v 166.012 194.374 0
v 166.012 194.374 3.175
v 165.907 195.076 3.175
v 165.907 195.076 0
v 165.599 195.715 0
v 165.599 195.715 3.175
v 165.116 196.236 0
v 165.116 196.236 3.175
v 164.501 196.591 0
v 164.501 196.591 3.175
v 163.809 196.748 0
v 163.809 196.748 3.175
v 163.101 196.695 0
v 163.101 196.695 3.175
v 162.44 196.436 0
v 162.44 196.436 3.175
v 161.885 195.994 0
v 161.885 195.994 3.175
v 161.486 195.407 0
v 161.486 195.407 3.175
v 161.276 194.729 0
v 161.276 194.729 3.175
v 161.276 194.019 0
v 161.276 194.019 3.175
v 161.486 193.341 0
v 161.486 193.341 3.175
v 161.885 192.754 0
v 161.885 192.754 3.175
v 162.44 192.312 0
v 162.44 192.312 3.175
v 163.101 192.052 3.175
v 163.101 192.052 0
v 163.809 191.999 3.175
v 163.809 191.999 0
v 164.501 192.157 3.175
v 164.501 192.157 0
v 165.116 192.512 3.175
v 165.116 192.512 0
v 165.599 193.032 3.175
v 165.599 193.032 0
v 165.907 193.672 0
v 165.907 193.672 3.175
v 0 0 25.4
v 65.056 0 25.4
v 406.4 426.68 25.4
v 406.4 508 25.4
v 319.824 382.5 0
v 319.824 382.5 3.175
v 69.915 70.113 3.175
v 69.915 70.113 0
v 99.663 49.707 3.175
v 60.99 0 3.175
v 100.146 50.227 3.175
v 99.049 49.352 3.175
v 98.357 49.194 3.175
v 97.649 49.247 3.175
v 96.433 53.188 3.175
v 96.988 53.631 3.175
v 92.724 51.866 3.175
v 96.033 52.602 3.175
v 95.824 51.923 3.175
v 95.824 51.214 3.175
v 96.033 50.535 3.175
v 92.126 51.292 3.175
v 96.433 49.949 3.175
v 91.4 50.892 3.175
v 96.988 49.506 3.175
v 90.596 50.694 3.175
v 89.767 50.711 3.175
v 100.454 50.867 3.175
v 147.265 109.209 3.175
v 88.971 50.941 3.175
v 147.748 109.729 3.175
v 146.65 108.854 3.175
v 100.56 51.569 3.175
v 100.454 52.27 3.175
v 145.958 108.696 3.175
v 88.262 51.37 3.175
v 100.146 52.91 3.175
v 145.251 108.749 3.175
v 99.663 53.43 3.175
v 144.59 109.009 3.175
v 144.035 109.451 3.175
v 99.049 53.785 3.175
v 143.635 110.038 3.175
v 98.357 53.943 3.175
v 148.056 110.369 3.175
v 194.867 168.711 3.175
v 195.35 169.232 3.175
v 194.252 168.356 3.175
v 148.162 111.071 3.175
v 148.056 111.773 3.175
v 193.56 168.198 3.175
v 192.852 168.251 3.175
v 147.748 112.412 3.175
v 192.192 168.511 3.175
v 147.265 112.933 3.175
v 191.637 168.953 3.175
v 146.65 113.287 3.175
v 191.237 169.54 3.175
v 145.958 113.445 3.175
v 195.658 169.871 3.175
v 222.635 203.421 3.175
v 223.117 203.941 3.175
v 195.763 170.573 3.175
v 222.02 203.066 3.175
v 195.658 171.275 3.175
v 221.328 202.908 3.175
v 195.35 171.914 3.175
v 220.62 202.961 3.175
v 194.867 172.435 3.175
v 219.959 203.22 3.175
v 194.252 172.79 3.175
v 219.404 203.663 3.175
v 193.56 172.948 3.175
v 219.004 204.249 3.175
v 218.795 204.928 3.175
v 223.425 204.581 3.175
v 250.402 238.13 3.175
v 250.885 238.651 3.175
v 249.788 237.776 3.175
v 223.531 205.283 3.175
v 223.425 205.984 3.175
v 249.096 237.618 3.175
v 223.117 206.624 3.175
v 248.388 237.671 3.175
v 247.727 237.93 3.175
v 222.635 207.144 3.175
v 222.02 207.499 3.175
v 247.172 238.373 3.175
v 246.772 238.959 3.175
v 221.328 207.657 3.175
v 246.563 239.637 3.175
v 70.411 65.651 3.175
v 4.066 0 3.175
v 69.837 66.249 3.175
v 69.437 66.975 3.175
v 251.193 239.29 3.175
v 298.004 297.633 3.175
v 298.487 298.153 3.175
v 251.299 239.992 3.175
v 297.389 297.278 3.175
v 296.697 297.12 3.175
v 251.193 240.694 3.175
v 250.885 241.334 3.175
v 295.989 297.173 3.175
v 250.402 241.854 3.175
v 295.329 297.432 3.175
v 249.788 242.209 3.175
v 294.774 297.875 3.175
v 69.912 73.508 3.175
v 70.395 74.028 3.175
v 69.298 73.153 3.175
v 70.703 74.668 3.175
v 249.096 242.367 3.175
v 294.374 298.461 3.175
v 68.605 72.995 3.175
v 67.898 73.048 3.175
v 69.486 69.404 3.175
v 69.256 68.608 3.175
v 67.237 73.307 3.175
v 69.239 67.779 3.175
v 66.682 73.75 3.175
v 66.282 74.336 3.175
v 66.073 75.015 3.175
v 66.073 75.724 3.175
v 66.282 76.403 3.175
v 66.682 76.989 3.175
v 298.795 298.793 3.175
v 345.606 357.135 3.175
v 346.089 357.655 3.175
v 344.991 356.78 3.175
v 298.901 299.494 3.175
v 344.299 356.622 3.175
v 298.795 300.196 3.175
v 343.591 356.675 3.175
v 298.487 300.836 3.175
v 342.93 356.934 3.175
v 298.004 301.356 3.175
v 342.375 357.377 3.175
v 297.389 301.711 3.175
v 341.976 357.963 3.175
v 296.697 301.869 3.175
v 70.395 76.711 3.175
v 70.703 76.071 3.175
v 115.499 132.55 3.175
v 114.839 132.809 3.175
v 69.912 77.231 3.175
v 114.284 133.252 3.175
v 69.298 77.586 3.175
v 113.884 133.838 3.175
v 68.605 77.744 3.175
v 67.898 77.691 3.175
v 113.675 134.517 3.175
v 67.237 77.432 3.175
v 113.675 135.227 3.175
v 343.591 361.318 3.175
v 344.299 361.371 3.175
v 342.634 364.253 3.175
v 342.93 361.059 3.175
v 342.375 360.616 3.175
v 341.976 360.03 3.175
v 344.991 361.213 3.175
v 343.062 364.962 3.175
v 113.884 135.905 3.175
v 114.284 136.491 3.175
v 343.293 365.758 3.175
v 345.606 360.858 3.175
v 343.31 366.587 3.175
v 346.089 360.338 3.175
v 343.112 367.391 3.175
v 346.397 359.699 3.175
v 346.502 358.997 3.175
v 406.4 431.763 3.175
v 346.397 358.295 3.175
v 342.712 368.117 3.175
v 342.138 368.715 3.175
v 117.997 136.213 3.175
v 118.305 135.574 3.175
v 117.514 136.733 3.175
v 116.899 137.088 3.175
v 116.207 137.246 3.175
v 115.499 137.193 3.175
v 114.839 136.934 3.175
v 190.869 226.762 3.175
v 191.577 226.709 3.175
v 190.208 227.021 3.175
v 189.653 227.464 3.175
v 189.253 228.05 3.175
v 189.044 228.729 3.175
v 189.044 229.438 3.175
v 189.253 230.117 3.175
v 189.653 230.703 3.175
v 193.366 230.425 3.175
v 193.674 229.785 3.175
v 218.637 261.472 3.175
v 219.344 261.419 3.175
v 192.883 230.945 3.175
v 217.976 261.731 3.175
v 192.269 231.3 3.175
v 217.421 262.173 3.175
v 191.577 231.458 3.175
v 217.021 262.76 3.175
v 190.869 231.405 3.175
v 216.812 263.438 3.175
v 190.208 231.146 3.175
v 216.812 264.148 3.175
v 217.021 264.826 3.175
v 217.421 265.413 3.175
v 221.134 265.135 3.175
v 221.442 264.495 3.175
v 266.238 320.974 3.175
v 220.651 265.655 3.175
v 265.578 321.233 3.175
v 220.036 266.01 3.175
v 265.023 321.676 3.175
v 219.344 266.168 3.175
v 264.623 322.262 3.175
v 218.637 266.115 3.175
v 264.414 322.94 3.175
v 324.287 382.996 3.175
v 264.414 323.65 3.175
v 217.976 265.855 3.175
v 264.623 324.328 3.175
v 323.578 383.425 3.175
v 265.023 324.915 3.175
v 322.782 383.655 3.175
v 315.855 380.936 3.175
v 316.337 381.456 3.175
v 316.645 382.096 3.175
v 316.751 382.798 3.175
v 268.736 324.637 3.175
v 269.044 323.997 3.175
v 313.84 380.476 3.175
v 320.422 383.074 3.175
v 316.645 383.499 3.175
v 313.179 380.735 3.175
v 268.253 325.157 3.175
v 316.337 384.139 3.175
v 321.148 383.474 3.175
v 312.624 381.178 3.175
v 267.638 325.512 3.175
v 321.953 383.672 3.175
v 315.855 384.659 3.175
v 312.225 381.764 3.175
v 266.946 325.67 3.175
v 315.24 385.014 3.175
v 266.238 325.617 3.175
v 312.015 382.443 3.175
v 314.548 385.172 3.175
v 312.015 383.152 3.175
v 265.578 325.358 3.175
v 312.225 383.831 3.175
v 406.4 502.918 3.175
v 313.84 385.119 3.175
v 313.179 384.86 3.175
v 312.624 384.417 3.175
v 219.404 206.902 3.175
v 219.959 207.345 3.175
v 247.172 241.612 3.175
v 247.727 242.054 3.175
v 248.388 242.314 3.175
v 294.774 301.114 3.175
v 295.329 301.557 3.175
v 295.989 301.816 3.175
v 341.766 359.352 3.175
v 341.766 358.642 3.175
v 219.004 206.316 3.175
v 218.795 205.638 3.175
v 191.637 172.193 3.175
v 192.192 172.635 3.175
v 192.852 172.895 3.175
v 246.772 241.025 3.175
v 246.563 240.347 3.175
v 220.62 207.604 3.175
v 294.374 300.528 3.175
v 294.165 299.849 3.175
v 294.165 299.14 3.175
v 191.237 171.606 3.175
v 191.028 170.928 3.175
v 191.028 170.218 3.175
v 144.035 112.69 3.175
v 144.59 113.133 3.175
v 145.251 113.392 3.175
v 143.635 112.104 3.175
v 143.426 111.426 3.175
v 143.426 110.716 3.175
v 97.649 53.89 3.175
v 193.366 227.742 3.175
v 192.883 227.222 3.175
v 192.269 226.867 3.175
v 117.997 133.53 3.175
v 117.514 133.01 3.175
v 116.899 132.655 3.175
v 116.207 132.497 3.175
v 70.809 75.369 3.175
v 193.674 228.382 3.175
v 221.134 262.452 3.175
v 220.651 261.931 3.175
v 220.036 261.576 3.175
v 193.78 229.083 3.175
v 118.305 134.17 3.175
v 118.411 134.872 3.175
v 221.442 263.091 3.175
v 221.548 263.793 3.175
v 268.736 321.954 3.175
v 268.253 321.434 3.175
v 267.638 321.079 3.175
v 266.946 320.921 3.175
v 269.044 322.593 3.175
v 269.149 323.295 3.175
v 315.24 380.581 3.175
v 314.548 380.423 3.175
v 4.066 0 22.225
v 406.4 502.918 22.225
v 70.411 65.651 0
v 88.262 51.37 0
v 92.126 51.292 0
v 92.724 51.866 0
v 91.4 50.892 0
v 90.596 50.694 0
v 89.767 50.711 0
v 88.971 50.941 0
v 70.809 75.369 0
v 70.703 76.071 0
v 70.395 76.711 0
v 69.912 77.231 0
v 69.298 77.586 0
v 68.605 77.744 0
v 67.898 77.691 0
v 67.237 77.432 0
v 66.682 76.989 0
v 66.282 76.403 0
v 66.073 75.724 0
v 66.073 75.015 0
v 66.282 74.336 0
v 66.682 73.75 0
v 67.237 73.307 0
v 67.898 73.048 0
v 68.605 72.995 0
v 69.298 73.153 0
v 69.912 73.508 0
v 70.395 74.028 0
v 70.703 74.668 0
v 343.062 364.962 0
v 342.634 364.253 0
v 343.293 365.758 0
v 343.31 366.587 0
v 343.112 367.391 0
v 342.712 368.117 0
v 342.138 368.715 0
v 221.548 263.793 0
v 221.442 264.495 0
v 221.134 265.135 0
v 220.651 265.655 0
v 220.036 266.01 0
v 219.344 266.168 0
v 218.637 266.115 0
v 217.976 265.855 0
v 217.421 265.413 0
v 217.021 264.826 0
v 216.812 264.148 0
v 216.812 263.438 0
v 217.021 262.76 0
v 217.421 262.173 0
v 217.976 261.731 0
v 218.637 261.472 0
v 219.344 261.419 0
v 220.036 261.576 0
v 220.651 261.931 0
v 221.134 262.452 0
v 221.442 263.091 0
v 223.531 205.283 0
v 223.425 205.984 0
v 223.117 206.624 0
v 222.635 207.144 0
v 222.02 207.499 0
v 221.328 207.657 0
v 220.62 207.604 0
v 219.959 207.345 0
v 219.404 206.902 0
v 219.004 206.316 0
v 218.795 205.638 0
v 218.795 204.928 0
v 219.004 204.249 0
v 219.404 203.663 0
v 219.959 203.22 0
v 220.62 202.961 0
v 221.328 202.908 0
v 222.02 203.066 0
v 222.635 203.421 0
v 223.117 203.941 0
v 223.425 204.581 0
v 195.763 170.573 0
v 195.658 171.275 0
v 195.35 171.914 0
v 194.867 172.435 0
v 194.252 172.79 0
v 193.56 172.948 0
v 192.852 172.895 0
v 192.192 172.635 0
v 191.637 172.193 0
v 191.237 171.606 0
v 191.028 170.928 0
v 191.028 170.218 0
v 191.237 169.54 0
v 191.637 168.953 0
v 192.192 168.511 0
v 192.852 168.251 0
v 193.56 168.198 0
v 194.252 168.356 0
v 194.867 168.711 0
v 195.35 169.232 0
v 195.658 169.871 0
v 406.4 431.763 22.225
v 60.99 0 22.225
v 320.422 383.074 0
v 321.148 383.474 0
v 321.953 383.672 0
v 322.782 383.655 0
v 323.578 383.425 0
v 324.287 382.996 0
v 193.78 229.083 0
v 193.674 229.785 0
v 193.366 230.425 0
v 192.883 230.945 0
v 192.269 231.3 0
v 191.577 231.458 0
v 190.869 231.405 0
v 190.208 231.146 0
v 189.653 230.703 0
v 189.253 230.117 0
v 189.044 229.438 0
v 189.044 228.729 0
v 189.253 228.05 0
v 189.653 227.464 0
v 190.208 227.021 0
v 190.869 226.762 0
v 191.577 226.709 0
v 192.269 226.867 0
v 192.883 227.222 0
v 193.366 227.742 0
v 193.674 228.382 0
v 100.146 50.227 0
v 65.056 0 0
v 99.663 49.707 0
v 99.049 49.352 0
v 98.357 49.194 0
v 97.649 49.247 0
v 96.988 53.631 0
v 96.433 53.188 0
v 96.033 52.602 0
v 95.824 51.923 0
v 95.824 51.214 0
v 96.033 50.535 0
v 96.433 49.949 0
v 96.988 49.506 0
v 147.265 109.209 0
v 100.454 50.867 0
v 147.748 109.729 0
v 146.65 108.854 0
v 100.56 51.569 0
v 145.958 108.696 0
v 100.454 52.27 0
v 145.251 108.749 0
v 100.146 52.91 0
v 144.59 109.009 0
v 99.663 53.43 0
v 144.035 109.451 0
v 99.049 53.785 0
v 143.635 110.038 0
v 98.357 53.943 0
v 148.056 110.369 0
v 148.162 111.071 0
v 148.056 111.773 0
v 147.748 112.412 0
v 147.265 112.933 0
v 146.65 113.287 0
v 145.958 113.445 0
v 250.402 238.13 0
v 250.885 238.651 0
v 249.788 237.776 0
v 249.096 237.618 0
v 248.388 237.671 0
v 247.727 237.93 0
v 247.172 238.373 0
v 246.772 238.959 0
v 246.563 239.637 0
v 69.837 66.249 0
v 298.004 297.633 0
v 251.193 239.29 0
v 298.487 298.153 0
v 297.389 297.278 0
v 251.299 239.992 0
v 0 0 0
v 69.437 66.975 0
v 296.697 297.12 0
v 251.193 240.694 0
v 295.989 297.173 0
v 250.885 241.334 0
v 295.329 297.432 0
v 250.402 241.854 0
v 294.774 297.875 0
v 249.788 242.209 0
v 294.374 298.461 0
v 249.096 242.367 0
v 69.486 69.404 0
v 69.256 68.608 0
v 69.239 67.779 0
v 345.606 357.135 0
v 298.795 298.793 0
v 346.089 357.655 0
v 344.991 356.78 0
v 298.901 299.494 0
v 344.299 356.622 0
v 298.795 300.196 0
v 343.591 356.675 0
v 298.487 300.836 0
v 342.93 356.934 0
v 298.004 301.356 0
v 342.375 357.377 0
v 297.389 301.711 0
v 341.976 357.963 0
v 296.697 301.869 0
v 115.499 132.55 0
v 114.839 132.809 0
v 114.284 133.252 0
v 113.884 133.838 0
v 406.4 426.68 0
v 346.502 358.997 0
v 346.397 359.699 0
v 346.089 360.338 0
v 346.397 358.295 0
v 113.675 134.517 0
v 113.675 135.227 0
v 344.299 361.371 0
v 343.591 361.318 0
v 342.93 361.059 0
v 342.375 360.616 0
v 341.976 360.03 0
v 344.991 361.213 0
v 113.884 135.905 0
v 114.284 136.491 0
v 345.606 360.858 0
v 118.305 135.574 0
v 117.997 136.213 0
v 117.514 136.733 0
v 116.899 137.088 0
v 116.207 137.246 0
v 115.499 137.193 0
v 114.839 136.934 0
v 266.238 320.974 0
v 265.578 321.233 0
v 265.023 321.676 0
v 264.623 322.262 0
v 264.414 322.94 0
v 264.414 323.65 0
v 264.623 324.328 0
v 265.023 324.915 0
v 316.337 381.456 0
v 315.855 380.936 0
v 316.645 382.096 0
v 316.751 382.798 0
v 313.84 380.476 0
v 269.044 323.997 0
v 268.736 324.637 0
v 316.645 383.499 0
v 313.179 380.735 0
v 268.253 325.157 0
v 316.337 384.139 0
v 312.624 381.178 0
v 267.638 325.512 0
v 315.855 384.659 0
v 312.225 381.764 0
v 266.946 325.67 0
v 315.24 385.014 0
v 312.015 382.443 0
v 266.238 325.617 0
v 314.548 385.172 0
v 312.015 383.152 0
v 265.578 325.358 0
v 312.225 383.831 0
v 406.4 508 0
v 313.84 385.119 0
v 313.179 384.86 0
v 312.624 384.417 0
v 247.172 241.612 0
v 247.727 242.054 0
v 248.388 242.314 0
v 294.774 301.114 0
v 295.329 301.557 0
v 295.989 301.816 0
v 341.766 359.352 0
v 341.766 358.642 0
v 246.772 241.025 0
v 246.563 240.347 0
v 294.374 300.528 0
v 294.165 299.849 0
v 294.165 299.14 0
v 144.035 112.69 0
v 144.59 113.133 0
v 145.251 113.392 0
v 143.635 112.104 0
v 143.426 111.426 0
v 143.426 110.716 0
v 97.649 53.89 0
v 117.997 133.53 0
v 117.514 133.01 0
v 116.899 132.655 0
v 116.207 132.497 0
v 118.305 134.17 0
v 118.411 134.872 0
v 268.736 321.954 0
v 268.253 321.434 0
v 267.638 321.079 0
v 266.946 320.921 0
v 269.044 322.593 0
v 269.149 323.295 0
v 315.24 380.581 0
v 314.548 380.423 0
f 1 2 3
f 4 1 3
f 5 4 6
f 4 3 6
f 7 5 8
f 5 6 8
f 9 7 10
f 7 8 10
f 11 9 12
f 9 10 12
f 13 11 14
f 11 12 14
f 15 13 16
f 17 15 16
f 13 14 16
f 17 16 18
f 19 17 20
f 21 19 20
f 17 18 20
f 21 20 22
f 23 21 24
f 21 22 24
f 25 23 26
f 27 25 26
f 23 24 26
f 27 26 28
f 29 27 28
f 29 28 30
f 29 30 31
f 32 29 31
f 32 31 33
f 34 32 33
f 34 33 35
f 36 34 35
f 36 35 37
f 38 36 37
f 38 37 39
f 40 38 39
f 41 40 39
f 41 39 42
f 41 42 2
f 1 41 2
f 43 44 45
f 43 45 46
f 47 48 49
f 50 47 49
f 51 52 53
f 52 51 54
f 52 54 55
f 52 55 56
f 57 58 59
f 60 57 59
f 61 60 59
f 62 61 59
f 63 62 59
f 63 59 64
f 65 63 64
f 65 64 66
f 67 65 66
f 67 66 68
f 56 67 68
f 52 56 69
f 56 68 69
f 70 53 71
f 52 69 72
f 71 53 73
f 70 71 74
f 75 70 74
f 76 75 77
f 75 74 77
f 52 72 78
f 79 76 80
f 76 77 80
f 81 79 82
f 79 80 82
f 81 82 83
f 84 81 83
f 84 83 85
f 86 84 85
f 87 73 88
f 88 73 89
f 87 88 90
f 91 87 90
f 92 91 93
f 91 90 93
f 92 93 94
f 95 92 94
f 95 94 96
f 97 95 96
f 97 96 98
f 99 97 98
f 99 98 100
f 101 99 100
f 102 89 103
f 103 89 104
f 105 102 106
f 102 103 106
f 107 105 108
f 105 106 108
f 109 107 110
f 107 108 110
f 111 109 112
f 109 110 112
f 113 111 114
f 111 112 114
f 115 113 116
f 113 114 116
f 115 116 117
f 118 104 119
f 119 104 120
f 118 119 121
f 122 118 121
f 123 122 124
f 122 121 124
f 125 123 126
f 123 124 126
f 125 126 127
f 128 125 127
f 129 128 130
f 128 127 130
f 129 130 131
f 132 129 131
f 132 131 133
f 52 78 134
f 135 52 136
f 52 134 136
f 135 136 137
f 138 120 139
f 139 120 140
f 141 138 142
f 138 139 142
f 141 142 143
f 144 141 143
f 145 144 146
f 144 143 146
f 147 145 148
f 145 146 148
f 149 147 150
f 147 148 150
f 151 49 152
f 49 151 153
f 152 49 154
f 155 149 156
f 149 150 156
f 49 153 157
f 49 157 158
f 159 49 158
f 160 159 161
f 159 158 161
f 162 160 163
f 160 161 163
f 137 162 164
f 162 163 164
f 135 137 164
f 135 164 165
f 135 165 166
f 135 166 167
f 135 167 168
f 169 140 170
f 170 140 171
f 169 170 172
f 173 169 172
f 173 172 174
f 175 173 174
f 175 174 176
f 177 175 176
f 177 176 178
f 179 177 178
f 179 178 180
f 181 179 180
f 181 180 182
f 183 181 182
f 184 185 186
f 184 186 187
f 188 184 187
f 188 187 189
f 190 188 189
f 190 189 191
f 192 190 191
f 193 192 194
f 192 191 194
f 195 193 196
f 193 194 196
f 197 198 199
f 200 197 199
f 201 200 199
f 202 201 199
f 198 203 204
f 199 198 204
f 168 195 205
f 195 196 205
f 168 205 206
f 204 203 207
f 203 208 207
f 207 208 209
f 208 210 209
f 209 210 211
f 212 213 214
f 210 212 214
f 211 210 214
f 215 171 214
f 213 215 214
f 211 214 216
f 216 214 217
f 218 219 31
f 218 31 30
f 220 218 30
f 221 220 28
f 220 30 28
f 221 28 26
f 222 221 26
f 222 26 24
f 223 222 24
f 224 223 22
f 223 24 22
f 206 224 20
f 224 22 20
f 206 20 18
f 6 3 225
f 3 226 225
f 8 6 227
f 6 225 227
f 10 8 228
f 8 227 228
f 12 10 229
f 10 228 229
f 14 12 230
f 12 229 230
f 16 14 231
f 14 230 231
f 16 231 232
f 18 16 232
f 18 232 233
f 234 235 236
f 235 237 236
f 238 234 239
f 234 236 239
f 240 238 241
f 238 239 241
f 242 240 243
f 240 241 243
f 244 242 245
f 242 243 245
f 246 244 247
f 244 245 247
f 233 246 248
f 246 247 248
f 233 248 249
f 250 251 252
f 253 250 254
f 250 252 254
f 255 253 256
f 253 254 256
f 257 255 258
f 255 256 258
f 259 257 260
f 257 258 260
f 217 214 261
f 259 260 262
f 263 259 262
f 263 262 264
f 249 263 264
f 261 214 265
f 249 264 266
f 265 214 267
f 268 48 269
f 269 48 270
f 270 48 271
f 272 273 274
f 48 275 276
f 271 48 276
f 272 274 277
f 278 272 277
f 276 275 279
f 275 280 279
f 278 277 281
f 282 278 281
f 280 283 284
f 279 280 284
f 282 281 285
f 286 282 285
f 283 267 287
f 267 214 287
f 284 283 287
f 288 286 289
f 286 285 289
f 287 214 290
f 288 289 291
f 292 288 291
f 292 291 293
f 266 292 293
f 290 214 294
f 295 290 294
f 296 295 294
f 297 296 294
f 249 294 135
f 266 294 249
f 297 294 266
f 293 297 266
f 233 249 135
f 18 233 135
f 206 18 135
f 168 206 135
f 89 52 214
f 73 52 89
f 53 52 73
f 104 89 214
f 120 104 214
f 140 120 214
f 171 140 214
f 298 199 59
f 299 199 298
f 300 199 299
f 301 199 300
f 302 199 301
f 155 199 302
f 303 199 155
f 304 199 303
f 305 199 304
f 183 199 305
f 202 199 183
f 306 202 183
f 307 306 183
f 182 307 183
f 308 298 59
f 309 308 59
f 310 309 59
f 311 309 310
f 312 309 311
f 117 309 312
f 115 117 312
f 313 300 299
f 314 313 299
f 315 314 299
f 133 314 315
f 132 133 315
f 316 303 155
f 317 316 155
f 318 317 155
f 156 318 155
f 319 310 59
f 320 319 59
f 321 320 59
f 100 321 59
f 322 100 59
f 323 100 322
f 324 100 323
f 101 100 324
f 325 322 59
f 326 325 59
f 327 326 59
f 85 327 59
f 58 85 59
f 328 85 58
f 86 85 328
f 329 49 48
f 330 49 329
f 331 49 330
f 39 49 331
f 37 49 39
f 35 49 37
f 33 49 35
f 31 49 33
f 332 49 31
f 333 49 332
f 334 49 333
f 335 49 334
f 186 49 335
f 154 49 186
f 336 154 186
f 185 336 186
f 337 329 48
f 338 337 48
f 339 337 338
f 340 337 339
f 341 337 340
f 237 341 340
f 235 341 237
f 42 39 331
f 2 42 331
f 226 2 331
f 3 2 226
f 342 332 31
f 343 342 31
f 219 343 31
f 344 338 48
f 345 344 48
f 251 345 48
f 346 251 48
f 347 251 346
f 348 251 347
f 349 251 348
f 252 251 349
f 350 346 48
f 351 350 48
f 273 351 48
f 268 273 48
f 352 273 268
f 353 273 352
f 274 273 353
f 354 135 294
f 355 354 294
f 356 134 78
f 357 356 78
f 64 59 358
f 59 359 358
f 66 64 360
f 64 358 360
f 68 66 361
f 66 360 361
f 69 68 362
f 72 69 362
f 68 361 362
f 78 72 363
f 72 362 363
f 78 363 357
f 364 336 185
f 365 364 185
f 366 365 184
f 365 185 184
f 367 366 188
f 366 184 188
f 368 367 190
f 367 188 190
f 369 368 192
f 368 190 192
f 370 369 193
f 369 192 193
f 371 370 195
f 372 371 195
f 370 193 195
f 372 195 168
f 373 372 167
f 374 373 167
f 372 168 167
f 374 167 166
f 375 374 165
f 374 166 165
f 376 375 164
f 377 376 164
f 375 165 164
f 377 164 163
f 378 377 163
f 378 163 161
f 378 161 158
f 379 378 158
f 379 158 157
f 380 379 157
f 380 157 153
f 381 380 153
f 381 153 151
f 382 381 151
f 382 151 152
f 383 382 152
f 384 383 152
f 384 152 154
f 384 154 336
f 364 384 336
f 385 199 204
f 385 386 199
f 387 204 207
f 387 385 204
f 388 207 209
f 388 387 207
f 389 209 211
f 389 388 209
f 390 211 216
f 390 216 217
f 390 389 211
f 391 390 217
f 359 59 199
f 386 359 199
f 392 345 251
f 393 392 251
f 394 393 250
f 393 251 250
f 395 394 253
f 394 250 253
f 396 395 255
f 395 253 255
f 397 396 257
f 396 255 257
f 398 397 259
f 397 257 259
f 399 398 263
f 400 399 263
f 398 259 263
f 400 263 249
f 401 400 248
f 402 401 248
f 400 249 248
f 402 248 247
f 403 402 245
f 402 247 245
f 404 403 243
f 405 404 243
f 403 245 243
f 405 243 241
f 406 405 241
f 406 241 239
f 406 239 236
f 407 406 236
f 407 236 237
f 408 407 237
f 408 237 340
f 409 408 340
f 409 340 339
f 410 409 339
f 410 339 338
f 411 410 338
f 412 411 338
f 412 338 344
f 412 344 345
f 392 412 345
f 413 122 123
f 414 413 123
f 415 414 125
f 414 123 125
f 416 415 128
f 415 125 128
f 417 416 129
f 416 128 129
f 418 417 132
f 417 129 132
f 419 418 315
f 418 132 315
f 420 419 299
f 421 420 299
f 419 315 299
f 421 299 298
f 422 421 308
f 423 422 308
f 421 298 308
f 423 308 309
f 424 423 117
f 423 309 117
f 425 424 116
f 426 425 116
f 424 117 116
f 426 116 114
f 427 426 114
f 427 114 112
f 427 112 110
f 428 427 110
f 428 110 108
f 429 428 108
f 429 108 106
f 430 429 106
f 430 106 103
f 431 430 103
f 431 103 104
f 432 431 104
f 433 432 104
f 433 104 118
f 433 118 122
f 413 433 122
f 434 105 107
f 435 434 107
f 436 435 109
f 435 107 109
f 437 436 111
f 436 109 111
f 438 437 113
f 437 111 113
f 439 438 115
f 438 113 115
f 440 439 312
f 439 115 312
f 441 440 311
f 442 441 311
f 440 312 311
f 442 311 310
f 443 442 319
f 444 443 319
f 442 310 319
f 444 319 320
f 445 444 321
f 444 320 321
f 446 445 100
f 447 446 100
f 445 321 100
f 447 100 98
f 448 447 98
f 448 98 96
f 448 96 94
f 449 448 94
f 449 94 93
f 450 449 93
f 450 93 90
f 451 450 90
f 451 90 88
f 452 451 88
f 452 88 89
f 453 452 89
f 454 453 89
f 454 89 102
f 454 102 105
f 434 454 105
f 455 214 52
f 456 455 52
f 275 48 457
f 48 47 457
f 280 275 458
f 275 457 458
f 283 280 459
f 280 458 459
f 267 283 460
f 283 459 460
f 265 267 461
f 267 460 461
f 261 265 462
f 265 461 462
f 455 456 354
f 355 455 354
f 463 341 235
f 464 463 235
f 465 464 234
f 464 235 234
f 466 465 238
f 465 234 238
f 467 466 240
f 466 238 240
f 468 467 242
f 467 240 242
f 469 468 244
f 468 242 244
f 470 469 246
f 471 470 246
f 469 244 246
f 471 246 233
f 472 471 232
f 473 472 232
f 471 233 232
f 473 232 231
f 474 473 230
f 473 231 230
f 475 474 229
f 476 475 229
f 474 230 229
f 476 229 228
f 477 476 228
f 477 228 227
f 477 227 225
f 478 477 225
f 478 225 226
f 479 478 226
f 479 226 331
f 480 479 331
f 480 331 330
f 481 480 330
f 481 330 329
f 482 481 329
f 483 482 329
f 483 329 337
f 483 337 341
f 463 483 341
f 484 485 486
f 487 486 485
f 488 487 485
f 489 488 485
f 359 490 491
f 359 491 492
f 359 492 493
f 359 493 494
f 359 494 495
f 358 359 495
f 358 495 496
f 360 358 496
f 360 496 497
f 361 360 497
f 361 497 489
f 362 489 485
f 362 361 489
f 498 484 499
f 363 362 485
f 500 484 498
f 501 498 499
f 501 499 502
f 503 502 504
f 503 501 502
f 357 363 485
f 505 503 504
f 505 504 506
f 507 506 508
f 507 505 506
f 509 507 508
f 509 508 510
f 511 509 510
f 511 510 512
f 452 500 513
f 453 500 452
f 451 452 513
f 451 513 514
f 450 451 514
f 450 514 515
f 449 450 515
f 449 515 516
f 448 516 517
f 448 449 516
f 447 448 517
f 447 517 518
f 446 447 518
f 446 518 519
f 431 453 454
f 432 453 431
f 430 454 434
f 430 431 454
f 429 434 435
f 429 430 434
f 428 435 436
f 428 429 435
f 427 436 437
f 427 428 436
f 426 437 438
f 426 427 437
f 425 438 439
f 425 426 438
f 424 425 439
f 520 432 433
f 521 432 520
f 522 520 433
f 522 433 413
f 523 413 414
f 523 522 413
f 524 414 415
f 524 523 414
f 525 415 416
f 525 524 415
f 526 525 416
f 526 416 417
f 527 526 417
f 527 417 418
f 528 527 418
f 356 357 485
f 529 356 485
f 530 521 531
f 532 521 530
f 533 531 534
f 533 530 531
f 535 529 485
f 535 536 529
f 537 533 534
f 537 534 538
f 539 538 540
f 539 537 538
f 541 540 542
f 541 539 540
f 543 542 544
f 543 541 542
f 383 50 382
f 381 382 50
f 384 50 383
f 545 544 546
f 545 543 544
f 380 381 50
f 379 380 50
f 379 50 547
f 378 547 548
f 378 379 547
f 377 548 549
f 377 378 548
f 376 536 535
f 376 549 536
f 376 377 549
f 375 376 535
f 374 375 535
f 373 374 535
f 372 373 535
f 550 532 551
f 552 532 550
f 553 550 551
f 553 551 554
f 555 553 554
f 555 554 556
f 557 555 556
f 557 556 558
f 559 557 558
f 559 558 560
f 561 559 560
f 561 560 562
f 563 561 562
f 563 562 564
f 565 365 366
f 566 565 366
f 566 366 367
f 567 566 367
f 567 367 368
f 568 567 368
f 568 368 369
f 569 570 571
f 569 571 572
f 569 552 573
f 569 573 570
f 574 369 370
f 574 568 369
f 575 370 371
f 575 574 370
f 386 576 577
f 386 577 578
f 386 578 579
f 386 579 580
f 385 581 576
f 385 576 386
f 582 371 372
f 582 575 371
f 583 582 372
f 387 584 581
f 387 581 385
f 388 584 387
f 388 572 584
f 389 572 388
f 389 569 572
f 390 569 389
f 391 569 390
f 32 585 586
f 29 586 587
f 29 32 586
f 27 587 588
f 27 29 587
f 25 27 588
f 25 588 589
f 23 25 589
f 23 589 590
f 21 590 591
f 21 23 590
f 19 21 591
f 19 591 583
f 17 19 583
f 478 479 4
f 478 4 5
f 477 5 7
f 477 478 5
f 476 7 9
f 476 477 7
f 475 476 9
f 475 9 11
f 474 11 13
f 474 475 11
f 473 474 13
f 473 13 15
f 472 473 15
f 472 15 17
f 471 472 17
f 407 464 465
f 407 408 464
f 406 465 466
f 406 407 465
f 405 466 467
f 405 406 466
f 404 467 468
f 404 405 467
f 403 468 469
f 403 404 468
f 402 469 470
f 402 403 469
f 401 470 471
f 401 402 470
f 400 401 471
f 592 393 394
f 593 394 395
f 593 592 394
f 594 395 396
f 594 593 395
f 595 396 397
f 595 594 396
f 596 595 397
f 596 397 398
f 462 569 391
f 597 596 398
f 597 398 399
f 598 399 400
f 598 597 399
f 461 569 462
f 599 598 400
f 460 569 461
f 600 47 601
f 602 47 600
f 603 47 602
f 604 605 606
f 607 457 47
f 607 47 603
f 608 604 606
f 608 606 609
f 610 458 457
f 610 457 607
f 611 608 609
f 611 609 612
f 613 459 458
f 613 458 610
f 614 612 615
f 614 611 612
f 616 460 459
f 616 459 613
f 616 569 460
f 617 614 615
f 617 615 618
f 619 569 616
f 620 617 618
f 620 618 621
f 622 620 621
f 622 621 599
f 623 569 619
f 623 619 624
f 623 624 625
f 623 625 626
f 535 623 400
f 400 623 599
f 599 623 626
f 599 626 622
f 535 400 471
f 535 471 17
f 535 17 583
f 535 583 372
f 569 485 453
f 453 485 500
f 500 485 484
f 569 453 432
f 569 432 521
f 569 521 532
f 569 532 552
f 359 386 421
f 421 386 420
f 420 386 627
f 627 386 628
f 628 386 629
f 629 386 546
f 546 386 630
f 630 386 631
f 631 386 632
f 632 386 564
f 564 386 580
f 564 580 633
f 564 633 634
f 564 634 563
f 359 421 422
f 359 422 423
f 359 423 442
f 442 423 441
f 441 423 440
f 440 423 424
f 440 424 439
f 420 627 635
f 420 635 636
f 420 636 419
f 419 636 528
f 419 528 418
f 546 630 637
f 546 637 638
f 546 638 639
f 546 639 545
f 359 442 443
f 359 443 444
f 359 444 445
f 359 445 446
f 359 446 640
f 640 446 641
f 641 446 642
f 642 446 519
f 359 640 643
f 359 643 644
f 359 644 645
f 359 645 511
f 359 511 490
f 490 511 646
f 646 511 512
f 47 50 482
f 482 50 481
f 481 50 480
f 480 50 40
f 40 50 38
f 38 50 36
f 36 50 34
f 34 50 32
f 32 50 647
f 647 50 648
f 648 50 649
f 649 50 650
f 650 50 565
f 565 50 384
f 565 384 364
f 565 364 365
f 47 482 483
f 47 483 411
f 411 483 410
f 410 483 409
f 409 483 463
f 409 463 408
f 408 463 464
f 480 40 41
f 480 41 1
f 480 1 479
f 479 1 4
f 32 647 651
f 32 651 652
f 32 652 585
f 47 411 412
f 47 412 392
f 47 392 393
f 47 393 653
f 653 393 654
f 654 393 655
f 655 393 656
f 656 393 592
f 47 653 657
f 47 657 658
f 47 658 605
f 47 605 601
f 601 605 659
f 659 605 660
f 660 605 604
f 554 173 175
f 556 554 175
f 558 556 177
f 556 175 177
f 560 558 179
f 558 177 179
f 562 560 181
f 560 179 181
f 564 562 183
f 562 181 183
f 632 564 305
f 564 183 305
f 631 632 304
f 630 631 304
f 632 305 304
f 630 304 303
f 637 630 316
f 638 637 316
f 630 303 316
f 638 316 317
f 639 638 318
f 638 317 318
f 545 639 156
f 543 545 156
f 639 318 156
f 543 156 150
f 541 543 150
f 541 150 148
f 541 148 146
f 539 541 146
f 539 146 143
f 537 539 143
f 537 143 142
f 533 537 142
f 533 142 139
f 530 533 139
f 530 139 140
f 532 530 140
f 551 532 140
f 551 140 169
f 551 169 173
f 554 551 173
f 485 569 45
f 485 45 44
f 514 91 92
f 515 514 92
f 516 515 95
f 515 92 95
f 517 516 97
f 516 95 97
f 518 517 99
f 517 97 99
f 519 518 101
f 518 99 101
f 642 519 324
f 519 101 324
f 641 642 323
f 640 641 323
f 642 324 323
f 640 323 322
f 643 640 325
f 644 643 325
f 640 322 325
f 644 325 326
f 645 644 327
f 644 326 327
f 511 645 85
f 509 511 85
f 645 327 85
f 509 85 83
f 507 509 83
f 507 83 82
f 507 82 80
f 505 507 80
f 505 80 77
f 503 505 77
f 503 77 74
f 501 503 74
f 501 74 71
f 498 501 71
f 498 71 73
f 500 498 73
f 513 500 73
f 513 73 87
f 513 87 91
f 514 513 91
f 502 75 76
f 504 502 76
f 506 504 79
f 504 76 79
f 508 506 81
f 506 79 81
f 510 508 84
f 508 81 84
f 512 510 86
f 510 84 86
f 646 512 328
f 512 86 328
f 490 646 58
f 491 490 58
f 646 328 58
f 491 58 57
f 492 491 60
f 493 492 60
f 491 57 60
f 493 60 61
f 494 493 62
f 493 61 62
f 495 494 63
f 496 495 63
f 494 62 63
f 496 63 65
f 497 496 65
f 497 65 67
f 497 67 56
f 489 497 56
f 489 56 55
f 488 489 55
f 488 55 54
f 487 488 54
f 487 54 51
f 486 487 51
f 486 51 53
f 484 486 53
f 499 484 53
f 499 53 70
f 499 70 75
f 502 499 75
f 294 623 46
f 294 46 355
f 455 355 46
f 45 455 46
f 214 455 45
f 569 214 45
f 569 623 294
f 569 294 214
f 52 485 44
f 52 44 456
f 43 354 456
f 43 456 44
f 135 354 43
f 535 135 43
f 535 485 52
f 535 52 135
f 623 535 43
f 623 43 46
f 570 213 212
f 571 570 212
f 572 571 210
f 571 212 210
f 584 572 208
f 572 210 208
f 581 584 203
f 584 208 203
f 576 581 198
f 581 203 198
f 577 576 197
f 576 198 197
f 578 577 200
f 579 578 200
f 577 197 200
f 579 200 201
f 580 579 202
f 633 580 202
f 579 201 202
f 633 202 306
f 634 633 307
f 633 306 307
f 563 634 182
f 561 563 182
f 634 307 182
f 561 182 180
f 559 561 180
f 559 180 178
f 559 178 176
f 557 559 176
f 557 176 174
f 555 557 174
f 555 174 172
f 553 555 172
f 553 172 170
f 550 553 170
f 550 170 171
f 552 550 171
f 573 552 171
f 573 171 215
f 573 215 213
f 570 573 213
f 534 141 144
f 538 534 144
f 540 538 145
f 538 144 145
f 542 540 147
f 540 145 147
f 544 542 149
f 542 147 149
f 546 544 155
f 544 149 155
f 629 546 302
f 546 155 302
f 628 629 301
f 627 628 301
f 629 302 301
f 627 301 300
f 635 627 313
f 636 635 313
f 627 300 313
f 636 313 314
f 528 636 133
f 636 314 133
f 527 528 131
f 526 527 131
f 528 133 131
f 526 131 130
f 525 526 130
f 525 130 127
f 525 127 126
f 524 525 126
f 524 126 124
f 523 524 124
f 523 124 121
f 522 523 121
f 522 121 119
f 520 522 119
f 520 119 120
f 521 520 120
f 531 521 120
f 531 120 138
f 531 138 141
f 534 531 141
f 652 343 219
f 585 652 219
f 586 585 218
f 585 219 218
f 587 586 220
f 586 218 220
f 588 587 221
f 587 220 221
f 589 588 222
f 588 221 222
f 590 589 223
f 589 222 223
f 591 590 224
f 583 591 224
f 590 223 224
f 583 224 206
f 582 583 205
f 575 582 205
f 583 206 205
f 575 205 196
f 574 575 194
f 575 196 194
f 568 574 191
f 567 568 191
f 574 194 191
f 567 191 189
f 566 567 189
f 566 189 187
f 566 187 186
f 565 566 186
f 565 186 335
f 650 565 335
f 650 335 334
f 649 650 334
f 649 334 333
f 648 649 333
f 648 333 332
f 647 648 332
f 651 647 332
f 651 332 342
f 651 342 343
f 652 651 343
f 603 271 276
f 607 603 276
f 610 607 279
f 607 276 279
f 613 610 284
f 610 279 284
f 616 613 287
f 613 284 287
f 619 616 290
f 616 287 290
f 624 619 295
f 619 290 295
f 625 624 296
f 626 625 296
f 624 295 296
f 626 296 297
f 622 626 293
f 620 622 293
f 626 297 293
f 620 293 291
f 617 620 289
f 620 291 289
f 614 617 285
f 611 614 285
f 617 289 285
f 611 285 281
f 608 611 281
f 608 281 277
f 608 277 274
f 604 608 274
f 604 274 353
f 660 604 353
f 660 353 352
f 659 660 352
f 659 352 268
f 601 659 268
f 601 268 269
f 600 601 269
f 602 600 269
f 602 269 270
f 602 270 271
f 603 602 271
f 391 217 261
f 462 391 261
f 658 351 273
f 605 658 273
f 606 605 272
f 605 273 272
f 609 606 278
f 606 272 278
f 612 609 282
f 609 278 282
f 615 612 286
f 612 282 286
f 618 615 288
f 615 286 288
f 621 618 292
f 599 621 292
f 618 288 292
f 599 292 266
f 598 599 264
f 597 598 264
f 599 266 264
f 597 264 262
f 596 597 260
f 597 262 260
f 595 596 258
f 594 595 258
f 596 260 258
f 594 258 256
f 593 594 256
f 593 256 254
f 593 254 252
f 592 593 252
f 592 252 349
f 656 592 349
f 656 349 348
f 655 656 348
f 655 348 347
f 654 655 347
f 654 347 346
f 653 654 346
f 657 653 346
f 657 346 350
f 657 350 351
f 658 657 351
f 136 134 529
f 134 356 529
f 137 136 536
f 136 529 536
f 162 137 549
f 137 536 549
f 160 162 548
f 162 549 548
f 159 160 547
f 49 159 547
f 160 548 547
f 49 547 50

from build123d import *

# Parameters (mm, degrees)
BOSS_EXTRUDE1_DEPTH = 25.4
SHELL1_T            = -3.175
CUT_EXTRUDE1_START  = -7.62
SKETCH2_R           = 2.38125
CUT_EXTRUDE1_DEPTH  = 644.433085393
FILLET1_R           = 3.175


with BuildPart() as part:
    # Sketch1 → Boss-Extrude1 (new body)
    with BuildSketch(Plane.XY):
        Polygon((0, 0), (406.4, 508), (406.4, 426.680322185), (65.055742252, 0), align=None)
    extrude(amount=BOSS_EXTRUDE1_DEPTH)

    # Shell1
    shell1_openings = [part.faces().sort_by_distance(p)[0] for p in [
        (406.4, 467.340161092, 12.7),
        (32.527871126, 0, 12.7),
    ]]
    offset(amount=SHELL1_T, openings=shell1_openings, kind=Kind.INTERSECTION)

    # Sketch2 → Cut-Extrude1 (cut, through all)
    with BuildSketch(Plane.XY.offset(25.4).offset(CUT_EXTRUDE1_START)):
        with Locations((68.427533771, 75.369457487)):
            Circle(SKETCH2_R)
        with Locations((116.029296395, 134.871660767)):
            Circle(SKETCH2_R)
        with Locations((163.631059019, 194.373864047)):
            Circle(SKETCH2_R)
        with Locations((193.382160659, 170.572982735)):
            Circle(SKETCH2_R)
        with Locations((145.780398035, 111.070779455)):
            Circle(SKETCH2_R)
        with Locations((98.178635411, 51.568576176)):
            Circle(SKETCH2_R)
        with Locations((344.121075633, 358.996626453)):
            Circle(SKETCH2_R)
        with Locations((296.51931301, 299.494423174)):
            Circle(SKETCH2_R)
        with Locations((248.917550386, 239.992219894)):
            Circle(SKETCH2_R)
        with Locations((219.166448746, 263.793101206)):
            Circle(SKETCH2_R)
        with Locations((266.76821137, 323.295304486)):
            Circle(SKETCH2_R)
        with Locations((314.369973994, 382.797507765)):
            Circle(SKETCH2_R)
        with Locations((191.398753883, 229.083482626)):
            Circle(SKETCH2_R)
        with Locations((221.149855522, 205.282601314)):
            Circle(SKETCH2_R)
        Polygon((90.740860001, 49.386828722), (344.616927327, 366.73191288), (321.807749404, 384.979255219), (67.931682077, 67.634171061), align=None)
    extrude(amount=-CUT_EXTRUDE1_DEPTH, mode=Mode.SUBTRACT)

    # Fillet1
    fillet1_edges = [part.edges().sort_by_distance(p)[0] for p in [
        (90.740860001, 49.386828722, 1.5875),
        (67.931682077, 67.634171061, 1.5875),
        (321.807749404, 384.979255219, 1.5875),
        (344.616927327, 366.73191288, 1.5875),
    ]]
    fillet(fillet1_edges, radius=FILLET1_R)


solid = part.part
